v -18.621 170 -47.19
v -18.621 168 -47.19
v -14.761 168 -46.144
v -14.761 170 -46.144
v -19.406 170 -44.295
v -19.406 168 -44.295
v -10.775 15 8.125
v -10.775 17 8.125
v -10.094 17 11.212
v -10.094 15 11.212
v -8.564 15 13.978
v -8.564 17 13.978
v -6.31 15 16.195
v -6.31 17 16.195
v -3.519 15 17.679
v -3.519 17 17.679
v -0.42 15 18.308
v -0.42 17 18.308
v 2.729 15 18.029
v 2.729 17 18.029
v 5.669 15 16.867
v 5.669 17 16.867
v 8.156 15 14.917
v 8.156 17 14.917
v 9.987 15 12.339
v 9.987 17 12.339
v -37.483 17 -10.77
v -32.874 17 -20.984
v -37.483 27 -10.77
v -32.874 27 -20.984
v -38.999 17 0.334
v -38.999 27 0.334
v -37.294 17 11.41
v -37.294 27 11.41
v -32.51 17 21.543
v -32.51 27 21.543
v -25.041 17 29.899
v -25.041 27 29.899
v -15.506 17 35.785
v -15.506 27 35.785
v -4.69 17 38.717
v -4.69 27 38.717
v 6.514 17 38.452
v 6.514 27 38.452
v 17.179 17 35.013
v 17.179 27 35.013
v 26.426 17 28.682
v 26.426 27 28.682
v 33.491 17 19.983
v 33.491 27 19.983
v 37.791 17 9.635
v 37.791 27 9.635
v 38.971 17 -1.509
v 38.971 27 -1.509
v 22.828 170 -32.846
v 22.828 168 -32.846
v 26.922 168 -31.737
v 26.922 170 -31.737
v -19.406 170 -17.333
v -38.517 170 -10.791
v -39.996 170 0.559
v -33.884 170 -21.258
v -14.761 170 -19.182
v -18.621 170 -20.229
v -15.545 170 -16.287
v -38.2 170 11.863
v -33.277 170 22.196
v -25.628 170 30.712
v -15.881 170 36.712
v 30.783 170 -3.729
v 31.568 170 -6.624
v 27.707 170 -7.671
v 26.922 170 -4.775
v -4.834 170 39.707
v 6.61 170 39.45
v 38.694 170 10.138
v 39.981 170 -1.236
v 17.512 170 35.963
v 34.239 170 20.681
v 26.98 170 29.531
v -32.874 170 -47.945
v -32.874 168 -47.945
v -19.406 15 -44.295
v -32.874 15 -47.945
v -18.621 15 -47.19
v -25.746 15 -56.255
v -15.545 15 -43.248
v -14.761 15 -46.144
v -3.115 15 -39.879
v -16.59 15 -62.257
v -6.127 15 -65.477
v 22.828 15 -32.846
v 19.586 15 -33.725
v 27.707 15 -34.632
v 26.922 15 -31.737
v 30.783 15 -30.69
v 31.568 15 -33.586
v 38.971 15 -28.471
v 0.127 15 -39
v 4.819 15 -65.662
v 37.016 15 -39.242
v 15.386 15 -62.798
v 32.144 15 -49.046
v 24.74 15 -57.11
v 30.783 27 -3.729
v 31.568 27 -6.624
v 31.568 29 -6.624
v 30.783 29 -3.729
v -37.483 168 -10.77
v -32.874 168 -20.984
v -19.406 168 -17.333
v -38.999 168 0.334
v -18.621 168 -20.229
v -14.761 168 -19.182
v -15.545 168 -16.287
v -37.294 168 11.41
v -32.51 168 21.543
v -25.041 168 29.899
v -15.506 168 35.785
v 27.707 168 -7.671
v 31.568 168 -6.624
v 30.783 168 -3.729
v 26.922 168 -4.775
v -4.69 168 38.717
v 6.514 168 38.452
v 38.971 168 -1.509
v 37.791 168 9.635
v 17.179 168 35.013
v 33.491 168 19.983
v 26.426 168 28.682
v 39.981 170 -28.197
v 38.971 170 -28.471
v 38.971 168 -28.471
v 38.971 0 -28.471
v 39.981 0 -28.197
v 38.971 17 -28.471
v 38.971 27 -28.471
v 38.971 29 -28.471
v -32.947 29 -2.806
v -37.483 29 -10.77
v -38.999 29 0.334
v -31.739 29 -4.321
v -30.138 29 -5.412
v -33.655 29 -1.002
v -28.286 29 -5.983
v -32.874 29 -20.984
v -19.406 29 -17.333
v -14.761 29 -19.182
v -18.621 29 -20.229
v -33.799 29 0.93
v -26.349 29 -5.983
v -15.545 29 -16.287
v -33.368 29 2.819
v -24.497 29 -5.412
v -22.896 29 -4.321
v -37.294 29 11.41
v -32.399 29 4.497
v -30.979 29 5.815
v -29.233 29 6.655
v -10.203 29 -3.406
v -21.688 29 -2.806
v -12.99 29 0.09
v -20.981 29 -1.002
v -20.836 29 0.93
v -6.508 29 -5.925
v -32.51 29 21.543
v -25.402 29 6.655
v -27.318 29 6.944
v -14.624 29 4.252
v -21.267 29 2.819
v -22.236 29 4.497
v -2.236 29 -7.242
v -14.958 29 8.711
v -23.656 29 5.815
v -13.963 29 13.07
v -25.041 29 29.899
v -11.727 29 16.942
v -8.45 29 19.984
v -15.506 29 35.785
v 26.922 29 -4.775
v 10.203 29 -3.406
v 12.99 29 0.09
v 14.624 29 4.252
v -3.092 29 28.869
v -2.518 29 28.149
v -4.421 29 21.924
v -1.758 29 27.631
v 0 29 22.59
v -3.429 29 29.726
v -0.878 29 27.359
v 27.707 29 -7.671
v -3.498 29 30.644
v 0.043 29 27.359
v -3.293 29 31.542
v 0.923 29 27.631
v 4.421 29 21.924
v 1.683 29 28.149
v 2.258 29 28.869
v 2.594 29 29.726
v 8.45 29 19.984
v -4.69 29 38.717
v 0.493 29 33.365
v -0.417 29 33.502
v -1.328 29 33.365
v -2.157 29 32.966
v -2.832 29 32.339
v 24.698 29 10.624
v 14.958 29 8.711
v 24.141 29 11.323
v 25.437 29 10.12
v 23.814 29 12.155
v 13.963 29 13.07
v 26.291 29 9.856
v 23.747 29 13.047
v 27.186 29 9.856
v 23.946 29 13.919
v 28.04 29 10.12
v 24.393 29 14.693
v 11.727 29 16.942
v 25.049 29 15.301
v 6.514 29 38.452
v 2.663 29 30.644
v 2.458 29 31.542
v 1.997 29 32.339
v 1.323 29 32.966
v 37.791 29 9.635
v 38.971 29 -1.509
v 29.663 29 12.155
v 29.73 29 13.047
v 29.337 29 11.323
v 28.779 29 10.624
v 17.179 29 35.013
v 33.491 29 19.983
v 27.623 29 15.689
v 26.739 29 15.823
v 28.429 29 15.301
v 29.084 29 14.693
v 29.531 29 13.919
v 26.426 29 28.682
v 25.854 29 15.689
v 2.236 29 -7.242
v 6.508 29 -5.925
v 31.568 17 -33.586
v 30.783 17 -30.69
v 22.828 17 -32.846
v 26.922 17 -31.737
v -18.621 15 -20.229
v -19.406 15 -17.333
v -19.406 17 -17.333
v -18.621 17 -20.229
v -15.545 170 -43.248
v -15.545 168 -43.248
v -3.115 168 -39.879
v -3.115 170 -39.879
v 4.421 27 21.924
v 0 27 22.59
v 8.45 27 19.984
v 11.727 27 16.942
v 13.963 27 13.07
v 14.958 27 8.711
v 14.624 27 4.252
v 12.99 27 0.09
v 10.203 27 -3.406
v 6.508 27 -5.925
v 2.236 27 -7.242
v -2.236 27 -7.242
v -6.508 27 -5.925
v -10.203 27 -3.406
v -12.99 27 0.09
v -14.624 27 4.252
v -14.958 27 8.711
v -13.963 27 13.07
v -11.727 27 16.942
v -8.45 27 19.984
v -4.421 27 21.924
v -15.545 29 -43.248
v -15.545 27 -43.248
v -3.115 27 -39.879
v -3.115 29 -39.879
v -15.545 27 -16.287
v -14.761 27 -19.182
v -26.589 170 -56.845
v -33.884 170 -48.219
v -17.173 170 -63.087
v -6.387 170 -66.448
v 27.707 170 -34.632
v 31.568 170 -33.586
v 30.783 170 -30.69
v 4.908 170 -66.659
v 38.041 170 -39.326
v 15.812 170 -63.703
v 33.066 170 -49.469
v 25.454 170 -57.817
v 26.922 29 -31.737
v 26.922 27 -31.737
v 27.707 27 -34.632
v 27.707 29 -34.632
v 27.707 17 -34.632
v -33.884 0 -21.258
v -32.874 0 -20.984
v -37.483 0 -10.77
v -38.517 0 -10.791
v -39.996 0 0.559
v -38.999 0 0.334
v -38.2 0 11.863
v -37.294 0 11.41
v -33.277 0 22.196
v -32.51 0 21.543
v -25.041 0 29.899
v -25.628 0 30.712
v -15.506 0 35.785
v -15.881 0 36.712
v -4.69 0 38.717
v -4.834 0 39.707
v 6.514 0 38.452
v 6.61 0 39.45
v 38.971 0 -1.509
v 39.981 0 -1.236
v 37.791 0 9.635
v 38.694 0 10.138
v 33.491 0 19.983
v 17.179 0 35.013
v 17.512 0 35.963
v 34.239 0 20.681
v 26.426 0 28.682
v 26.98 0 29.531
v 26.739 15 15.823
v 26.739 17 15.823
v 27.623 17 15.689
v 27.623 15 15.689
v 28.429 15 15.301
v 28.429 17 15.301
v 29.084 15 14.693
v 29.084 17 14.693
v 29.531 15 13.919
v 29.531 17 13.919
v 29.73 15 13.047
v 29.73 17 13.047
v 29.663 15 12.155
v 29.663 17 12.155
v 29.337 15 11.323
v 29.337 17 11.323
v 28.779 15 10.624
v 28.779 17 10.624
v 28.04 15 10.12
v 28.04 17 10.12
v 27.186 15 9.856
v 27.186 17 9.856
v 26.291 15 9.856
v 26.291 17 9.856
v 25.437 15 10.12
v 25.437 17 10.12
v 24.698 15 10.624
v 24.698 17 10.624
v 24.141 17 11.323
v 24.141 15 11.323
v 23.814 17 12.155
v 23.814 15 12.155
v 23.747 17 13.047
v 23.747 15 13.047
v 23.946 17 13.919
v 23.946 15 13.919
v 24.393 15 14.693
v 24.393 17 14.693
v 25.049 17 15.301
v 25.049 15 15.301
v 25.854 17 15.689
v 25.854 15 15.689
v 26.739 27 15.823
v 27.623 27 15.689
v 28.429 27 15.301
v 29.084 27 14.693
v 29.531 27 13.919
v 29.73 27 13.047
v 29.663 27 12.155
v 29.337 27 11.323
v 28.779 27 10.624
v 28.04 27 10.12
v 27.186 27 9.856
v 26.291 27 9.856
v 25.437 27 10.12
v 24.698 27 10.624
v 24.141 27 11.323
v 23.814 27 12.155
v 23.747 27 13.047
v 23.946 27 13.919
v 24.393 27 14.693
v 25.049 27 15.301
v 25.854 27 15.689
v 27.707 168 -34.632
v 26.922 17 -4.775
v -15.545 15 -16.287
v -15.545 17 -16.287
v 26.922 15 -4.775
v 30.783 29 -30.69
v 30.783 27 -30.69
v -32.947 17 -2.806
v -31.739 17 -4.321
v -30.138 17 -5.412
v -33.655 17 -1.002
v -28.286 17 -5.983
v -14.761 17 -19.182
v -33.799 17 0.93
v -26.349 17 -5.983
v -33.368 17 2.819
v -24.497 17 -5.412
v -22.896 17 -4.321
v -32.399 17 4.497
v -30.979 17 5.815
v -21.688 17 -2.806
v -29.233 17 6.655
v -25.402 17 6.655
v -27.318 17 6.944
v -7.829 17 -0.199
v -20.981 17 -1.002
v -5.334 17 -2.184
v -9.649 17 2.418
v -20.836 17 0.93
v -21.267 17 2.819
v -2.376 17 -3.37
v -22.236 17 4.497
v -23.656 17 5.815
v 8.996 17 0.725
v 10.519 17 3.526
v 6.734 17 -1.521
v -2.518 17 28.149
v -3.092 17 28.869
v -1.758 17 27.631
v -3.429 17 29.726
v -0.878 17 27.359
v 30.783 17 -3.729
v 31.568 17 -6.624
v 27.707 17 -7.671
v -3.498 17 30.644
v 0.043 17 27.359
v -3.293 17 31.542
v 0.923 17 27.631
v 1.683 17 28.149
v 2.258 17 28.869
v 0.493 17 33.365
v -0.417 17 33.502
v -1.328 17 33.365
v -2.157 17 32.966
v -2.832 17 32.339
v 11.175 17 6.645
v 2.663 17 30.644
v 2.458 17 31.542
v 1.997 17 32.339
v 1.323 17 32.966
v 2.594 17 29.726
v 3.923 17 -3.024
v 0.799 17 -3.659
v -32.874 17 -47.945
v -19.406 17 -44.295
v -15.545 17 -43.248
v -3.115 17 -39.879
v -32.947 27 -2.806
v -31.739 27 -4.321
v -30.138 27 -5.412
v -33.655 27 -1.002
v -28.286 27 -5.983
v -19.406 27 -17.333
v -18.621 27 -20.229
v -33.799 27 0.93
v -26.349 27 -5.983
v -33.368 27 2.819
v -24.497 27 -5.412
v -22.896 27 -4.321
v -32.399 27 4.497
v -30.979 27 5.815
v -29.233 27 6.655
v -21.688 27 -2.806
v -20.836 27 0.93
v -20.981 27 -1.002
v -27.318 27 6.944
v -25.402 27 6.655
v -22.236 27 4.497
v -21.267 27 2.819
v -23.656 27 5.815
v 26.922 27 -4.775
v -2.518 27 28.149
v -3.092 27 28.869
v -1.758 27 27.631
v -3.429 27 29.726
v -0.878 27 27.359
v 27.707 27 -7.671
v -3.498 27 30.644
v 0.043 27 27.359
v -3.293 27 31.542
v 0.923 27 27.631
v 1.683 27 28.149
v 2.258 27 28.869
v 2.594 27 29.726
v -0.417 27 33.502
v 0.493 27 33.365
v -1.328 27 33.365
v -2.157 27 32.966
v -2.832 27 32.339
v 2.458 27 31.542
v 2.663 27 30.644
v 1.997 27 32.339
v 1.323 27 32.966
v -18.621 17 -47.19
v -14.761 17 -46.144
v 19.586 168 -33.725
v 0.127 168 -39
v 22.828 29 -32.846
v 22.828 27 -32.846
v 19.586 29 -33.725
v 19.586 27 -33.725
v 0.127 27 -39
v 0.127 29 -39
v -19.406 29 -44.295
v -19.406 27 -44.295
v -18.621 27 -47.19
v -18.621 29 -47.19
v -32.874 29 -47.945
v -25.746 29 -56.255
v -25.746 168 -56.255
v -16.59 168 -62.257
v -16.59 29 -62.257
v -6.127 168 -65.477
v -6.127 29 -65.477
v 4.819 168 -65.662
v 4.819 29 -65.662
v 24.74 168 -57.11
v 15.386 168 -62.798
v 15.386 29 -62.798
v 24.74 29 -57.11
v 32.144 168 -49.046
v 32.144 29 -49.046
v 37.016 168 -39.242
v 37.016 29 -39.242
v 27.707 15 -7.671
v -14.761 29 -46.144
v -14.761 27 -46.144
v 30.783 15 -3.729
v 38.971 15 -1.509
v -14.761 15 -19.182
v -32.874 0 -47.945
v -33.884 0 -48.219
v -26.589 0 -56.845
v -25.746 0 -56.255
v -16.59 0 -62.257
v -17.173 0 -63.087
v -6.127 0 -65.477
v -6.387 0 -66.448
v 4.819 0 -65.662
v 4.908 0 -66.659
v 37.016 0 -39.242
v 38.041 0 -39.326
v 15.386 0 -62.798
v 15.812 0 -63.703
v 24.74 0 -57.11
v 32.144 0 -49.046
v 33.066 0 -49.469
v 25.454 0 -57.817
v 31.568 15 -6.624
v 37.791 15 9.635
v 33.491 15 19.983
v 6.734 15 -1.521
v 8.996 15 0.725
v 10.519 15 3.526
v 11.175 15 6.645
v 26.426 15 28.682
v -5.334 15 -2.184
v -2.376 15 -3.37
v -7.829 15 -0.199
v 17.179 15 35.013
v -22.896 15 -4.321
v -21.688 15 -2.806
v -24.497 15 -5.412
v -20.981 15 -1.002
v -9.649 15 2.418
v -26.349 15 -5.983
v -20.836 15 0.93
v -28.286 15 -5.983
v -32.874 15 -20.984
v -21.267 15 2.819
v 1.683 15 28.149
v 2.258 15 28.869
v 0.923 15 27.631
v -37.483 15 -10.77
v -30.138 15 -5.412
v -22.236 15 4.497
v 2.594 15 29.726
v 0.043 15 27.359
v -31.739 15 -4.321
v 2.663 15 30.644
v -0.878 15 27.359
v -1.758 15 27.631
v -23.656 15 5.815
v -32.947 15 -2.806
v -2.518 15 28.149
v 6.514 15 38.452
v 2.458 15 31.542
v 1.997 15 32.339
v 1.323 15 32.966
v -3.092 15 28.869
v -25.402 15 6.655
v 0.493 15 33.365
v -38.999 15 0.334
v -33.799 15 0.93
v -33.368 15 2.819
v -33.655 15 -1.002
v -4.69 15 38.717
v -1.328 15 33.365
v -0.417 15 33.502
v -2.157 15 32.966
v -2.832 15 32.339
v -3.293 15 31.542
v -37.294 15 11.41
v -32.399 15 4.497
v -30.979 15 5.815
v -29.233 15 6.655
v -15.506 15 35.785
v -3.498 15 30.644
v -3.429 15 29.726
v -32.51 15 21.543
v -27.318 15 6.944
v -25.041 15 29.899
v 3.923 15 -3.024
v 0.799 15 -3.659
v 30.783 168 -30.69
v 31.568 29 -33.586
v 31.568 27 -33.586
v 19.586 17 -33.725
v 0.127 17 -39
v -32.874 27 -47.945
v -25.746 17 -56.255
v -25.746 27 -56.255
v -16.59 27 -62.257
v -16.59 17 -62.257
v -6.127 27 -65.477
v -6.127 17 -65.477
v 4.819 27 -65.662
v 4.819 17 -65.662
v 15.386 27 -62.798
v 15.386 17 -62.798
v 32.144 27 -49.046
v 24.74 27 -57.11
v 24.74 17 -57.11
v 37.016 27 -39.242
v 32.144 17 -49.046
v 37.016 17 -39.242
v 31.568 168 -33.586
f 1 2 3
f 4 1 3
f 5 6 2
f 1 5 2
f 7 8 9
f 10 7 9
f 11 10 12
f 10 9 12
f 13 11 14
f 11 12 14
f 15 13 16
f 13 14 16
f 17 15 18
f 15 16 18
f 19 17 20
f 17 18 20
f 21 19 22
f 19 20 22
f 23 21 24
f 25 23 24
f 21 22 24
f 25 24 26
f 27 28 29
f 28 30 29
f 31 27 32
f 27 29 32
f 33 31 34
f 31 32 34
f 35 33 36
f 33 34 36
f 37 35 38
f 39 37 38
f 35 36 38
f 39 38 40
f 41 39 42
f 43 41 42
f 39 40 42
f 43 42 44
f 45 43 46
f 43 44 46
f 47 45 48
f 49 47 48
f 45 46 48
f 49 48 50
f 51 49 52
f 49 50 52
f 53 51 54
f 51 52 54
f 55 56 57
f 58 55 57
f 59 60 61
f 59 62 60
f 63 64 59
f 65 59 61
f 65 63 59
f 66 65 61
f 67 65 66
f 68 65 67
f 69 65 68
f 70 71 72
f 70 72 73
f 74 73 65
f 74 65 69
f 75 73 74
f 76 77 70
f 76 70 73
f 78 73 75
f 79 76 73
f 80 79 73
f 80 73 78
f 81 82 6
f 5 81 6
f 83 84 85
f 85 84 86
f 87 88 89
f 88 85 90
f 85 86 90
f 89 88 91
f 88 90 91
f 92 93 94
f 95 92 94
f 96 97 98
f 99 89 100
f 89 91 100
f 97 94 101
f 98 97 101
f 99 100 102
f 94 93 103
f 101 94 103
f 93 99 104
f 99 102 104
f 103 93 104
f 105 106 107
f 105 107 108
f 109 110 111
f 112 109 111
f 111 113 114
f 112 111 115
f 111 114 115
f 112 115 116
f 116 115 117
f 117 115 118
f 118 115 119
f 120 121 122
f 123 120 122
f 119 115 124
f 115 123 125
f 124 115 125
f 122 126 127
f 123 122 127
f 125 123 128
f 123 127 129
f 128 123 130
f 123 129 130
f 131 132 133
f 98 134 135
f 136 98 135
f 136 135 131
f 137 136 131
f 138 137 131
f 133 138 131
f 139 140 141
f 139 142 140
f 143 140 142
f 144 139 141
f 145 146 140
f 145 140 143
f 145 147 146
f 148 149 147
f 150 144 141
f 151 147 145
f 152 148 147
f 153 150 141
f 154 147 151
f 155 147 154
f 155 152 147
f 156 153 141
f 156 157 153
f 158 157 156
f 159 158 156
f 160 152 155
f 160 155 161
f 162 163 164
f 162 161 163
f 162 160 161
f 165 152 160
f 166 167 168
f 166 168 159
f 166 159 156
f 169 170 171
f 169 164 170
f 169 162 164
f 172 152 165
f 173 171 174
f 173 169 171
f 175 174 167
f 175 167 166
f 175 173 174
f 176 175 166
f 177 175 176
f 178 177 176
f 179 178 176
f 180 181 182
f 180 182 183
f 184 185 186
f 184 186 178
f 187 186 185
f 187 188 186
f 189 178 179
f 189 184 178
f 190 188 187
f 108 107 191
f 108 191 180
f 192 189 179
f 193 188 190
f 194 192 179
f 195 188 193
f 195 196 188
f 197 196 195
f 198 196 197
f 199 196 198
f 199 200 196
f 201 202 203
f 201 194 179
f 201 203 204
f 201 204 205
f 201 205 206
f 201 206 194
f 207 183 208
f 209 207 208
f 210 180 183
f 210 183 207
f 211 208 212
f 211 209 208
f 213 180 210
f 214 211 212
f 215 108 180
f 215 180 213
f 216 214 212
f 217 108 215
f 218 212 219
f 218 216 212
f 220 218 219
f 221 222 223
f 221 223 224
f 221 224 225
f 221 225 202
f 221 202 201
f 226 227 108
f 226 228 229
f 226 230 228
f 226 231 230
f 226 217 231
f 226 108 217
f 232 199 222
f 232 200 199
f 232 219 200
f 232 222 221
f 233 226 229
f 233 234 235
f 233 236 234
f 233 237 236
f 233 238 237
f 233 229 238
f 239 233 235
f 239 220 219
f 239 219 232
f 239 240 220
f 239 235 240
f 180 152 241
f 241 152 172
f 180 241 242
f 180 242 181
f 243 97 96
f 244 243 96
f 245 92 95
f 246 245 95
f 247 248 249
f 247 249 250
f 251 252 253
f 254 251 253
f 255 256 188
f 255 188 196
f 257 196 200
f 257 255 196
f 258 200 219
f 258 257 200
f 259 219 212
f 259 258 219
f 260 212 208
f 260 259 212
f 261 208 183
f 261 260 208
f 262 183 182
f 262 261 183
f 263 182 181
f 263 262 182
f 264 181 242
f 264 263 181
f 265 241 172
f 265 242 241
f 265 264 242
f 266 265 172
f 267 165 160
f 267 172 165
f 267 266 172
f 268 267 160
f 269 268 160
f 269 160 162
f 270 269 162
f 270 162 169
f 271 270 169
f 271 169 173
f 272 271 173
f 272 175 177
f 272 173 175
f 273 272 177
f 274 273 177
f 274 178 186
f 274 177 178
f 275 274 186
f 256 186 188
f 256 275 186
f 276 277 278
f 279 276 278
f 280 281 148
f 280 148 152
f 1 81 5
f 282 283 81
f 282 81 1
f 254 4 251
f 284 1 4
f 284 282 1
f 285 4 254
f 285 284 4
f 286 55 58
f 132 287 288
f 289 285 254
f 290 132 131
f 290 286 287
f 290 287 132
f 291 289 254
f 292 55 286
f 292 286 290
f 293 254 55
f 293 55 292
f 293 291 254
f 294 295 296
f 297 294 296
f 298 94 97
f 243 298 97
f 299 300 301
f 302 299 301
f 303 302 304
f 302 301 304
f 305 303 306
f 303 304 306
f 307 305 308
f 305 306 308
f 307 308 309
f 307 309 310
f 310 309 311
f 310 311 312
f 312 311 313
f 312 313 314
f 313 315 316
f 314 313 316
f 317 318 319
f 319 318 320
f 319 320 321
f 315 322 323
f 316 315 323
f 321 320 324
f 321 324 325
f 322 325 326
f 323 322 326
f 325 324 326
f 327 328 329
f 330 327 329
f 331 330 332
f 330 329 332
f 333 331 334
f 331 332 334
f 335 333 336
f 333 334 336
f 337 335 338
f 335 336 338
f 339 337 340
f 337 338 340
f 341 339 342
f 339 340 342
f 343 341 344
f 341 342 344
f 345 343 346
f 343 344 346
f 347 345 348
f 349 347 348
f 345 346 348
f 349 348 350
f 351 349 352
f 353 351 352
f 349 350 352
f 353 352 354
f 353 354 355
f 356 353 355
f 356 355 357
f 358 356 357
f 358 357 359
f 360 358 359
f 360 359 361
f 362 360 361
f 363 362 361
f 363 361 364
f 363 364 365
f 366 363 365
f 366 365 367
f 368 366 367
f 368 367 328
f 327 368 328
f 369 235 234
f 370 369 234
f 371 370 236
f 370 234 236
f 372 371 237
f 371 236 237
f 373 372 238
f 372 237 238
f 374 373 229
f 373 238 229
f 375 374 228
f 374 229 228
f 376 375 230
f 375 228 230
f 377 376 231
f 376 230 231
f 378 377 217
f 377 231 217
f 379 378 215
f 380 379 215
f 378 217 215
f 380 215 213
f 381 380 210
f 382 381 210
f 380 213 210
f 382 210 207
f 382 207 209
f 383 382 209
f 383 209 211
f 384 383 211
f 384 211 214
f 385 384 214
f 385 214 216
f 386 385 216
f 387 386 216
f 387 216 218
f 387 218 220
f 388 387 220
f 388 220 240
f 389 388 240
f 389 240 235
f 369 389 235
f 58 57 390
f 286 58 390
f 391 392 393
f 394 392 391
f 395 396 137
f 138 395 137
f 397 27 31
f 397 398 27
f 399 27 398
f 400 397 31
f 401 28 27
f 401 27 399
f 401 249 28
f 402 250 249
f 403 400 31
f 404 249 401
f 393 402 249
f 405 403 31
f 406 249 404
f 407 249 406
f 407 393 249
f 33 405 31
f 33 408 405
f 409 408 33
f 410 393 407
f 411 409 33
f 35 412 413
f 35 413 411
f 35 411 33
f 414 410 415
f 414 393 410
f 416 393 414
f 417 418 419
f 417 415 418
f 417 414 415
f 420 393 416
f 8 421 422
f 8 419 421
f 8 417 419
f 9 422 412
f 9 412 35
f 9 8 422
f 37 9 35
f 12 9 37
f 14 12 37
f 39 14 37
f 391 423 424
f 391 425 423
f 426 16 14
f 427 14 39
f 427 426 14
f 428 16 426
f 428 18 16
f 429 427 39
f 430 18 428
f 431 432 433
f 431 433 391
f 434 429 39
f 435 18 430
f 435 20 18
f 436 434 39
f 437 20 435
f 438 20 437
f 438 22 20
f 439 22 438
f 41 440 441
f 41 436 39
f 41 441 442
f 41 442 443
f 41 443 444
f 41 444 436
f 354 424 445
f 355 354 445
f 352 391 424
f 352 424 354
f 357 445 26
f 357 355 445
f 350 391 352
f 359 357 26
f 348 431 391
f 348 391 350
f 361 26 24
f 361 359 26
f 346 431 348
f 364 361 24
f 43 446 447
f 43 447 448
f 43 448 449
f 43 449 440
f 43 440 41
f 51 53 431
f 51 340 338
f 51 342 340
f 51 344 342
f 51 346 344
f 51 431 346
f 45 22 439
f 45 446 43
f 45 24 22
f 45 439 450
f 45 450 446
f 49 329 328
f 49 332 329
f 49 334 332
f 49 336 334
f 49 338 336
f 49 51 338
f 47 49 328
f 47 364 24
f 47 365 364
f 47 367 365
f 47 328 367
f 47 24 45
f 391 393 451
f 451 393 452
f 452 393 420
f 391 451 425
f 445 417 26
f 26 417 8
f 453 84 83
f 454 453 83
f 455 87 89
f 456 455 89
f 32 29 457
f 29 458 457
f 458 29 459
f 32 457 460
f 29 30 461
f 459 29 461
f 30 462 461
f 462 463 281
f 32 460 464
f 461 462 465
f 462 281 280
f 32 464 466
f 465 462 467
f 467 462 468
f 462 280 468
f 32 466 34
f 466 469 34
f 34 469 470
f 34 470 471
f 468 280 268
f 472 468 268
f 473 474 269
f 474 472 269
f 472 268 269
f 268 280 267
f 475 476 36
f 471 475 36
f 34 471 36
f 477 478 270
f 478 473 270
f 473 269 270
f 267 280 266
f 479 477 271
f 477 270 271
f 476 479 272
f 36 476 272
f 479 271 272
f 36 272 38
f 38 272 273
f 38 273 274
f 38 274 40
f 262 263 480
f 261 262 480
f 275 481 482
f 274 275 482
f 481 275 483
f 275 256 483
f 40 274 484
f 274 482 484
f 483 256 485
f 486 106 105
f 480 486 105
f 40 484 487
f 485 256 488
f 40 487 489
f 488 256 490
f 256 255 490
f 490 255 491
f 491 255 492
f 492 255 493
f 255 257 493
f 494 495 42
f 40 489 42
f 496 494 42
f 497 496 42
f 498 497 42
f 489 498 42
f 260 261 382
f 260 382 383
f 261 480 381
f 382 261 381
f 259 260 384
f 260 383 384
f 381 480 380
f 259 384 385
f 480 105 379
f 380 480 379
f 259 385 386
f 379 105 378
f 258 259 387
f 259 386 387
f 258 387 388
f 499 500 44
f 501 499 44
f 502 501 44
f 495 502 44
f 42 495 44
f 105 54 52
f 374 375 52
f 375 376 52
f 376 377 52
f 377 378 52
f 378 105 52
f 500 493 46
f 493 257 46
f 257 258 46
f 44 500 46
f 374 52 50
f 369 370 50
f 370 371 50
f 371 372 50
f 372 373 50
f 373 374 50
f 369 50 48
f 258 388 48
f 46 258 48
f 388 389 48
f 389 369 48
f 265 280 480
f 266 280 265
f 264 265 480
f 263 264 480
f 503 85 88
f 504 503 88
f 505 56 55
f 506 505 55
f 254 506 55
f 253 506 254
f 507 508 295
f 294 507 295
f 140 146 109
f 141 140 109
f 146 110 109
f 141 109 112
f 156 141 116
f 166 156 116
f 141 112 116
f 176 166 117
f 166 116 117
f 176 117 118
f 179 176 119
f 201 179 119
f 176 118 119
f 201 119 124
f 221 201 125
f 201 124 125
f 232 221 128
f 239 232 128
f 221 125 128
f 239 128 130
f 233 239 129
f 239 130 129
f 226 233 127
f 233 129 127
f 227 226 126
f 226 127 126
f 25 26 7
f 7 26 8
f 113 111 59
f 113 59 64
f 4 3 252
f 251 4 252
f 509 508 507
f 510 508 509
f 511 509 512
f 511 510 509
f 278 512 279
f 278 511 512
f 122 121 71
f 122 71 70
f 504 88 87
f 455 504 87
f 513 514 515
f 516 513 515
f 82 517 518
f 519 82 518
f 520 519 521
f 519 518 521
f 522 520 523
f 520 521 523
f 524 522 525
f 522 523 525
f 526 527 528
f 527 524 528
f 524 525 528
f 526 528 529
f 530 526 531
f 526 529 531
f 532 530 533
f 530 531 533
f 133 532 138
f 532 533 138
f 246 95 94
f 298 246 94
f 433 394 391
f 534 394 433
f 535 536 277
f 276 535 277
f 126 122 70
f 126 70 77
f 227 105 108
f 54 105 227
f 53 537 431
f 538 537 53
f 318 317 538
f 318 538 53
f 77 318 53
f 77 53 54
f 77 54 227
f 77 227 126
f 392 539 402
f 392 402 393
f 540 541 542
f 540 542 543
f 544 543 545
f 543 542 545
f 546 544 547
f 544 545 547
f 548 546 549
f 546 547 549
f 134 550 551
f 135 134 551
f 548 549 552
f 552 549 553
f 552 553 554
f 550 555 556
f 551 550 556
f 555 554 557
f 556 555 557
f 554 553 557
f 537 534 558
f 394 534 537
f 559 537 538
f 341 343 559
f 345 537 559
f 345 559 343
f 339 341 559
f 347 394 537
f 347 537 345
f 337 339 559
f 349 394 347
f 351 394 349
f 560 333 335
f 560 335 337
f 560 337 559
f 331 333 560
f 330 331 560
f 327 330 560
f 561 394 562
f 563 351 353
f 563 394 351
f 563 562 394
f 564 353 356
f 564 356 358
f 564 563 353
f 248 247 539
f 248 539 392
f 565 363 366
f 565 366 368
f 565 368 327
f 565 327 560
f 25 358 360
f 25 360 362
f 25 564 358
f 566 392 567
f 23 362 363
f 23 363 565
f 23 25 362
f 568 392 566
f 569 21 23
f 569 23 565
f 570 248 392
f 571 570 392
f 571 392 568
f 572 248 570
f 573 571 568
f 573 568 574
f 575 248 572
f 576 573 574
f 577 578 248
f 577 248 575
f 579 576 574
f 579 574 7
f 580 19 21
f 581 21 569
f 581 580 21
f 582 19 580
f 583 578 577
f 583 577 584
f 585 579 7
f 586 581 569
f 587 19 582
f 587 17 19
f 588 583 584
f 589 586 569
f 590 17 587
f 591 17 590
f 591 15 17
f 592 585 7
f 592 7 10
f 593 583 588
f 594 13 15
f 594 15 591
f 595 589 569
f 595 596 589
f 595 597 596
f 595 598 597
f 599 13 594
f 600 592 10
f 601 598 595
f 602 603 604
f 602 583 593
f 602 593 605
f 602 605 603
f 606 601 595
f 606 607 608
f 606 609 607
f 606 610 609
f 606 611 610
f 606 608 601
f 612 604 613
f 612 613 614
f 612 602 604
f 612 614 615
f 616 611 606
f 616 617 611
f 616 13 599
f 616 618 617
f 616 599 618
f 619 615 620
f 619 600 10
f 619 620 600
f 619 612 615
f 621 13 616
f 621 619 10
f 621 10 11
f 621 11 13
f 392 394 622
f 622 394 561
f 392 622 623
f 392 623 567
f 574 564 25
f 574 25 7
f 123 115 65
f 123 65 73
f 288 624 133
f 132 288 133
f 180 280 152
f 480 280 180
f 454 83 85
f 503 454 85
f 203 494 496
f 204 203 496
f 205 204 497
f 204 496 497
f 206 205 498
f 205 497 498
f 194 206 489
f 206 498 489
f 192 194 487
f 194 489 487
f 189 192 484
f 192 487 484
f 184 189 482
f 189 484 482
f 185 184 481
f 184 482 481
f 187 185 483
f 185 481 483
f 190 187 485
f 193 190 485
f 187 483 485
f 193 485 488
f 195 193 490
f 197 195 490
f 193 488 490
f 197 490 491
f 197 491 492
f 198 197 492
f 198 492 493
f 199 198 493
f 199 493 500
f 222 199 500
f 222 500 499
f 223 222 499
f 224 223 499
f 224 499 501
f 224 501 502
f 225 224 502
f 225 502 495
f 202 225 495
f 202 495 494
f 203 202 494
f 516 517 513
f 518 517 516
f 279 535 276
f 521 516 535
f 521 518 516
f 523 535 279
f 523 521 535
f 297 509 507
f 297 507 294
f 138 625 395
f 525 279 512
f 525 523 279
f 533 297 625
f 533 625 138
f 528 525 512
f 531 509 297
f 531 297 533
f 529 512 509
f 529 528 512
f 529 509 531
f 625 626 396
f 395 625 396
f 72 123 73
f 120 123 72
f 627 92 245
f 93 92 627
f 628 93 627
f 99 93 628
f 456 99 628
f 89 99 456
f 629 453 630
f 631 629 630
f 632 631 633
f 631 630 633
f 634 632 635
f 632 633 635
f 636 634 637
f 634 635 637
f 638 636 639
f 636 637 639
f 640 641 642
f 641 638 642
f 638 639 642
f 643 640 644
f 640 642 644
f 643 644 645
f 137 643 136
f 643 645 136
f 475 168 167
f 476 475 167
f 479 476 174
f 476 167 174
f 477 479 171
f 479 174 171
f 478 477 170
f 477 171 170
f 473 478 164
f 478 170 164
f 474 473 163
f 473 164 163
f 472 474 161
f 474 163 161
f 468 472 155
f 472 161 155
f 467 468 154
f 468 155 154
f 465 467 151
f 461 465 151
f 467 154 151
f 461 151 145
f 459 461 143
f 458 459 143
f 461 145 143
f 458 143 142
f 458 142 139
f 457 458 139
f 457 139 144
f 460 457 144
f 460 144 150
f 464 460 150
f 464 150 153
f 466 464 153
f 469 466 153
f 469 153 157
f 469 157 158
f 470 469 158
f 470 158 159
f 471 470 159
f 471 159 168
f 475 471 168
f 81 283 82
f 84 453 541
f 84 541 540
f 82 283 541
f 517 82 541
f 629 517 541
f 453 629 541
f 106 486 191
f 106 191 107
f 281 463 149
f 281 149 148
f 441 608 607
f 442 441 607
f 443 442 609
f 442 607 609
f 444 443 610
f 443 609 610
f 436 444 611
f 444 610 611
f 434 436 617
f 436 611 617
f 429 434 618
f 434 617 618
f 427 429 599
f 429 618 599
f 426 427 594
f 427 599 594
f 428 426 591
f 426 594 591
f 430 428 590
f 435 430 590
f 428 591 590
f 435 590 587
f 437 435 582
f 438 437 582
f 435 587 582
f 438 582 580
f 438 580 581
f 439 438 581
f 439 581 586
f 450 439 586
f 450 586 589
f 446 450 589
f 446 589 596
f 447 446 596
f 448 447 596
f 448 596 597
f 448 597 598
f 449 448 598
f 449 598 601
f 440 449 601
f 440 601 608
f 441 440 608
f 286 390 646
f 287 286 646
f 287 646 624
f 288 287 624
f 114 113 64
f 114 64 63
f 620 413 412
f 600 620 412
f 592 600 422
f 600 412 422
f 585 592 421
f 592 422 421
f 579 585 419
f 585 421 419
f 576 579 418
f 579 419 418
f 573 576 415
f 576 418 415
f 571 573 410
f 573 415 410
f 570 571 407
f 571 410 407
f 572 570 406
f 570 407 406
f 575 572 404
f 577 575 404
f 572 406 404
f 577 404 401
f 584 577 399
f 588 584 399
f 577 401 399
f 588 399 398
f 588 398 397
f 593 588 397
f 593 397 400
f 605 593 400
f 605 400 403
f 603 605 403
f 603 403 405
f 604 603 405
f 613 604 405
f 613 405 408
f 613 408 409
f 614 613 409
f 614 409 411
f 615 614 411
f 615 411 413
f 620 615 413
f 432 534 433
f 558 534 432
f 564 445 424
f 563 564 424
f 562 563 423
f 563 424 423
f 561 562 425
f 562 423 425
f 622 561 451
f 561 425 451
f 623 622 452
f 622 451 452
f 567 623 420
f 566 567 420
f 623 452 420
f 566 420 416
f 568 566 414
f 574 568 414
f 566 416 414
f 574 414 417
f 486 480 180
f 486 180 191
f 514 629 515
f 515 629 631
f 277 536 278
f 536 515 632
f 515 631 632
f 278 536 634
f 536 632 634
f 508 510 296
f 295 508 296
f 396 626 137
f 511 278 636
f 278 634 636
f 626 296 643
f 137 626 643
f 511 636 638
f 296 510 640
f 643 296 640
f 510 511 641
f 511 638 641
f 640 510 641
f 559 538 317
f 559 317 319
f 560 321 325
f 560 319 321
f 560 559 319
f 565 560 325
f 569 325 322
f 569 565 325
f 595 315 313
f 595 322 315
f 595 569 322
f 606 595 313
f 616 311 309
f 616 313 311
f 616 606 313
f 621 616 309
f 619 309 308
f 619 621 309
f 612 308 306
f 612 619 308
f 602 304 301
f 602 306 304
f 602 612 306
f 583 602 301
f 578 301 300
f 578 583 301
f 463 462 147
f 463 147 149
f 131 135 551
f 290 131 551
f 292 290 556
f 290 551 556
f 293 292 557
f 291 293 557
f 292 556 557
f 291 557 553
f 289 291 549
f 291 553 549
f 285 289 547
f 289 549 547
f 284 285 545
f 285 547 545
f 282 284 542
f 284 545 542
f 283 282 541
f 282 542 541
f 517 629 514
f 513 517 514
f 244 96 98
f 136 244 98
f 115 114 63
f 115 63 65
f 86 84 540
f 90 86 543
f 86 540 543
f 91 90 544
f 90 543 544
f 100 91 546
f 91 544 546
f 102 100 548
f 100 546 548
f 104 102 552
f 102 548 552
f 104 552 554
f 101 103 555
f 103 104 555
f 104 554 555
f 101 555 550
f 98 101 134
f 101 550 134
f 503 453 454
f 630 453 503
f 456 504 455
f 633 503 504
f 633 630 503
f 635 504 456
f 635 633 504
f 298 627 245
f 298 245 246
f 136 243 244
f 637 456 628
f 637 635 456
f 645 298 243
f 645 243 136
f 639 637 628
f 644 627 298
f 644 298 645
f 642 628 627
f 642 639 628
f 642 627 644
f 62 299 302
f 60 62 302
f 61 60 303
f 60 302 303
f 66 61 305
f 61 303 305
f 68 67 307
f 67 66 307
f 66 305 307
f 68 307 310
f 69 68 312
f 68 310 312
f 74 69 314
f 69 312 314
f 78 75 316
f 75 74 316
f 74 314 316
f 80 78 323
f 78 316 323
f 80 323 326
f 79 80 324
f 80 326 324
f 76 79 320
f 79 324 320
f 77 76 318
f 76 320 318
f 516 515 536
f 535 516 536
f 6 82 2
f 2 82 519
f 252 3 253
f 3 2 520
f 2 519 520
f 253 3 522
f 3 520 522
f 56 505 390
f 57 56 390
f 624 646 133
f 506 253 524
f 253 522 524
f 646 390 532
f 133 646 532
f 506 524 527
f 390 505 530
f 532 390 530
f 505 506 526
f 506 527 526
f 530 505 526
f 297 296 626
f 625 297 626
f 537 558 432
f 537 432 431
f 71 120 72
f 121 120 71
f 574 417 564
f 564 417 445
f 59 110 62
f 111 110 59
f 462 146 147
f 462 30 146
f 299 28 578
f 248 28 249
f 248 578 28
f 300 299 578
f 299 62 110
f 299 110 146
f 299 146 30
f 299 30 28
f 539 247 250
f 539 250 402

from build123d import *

# Parameters (mm, degrees)
SKETCH1_R               = 40
BOSS_EXTRUDE1_DEPTH     = 170
SKETCH3_R               = 39
CUT_EXTRUDE1_DEPTH      = 153
CUT_EXTRUDE2_START      = -15
SKETCH5_R               = 39
CUT_EXTRUDE2_DEPTH      = 15
SKETCH6_R               = 40
BOSS_EXTRUDE2_DEPTH     = 2
SKETCH12_R              = 15
CUT_EXTRUDE5_DEPTH      = 19
CUT_EXTRUDE6_DEPTH      = 19
SKETCH16_R              = 3.088837779
CUT_EXTRUDE7_DEPTH      = 19
SKETCH17_R              = 3
CUT_EXTRUDE8_DEPTH      = 19
SKETCH18_R              = 6.5
CUT_EXTRUDE9_DEPTH      = 19
BOSS_EXTRUDE3_START     = -2
SKETCH19_R              = 40
BOSS_EXTRUDE3_DEPTH     = 2
SPLIT1_SURFACE_1_BACK   = 205.206
SPLIT1_SURFACE_1_DEPTH  = 410.412
SPLIT1_SURFACE_2_BACK   = 205.206
SPLIT1_SURFACE_2_DEPTH  = 410.412
BODY_MOVE_COPY1_DEPTH   = 170
BODY_MOVE_COPY1_START   = 29
BODY_MOVE_COPY1_2_DEPTH = 139
BODY_MOVE_COPY1_3_DEPTH = 15
BODY_MOVE_COPY1_START_2 = 17
BODY_MOVE_COPY1_4_DEPTH = 10
BODY_MOVE_COPY1_5_DEPTH = 170
BODY_MOVE_COPY1_START_3 = 15
BODY_MOVE_COPY1_6_DEPTH = 2
BODY_MOVE_COPY1_START_4 = 27
BODY_MOVE_COPY1_7_DEPTH = 2
BODY_MOVE_COPY1_START_5 = 168
BODY_MOVE_COPY1_8_DEPTH = 2


# Read off the part's stored shape, not the designer's step: Body-Move/Copy1
with BuildPart() as part:
    # Sketch1 → Boss-Extrude1 (new body)
    with BuildSketch(Plane(origin=(0, 0, 0), x_dir=(1, 0, 0), z_dir=(0, 1, 0))):
        with Locations(Location((0, 0, 0), (0, 0, 270))):
            Circle(SKETCH1_R)
    extrude(amount=BOSS_EXTRUDE1_DEPTH)

    # Sketch3 → Cut-Extrude1 (cut)
    with BuildSketch(Plane(origin=(0, 170, 0), x_dir=(1, 0, 0), z_dir=(0, 1, 0))):
        with Locations(Location((0, 0, 0), (0, 0, 270))):
            Circle(SKETCH3_R)
    extrude(amount=-CUT_EXTRUDE1_DEPTH, mode=Mode.SUBTRACT)

    # Sketch5 → Cut-Extrude2 (cut)
    with BuildSketch(Plane.XZ.offset(CUT_EXTRUDE2_START)):
        with Locations(Location((0, 0, 0), (0, 0, 90))):
            Circle(SKETCH5_R)
    extrude(amount=CUT_EXTRUDE2_DEPTH, mode=Mode.SUBTRACT)

    # Sketch6 → Boss-Extrude2 (add)
    with BuildSketch(Plane(origin=(0, 27, 0), x_dir=(1, 0, 0), z_dir=(0, 1, 0))):
        with Locations(Location((0, 0, 0), (0, 0, 270))):
            Circle(SKETCH6_R)
    extrude(amount=BOSS_EXTRUDE2_DEPTH)

    # Sketch12 → Cut-Extrude5 (cut)
    with BuildSketch(Plane(origin=(0, 17, 0), x_dir=(1, 0, 0), z_dir=(0, 1, 0))):
        with Locations(Location((0, -7.590009818, 0), (0, 0, 270))):
            Circle(SKETCH12_R)
    extrude(amount=CUT_EXTRUDE5_DEPTH, mode=Mode.SUBTRACT)

    # Sketch15 → Cut-Extrude6 (cut)
    with BuildSketch(Plane(origin=(0, 17, 0), x_dir=(1, 0, 0), z_dir=(0, 1, 0))):
        with BuildLine():
            ThreePointArc((11.174993965, -6.645365205), (2.384185489, 3.45521331), (-9.64910652, -2.418446828))
            Line((-9.64910652, -2.418446828), (11.174993965, -6.645365205))
        make_face()
        with BuildLine():
            Line((9.986768127, -12.339026438), (-10.774875926, -8.124785595))
            ThreePointArc((-10.774875926, -8.124785595), (-1.992172654, -18.105108798), (9.986768127, -12.339026438))
        make_face()
    extrude(amount=-CUT_EXTRUDE6_DEPTH, mode=Mode.SUBTRACT)

    # Sketch16 → Cut-Extrude7 (cut)
    with BuildSketch(Plane.XZ.offset(-15)):
        with Locations(Location((-0.417469766, 30.413602278, 0), (0, 0, 90))):
            Circle(SKETCH16_R)
    extrude(amount=-CUT_EXTRUDE7_DEPTH, mode=Mode.SUBTRACT)

    # Sketch17 → Cut-Extrude8 (cut)
    with BuildSketch(Plane(origin=(0, 29, 0), x_dir=(1, 0, 0), z_dir=(0, 1, 0))):
        with Locations(Location((26.738607031, -12.822711748, 0), (0, 0, 270))):
            Circle(SKETCH17_R)
    extrude(amount=-CUT_EXTRUDE8_DEPTH, mode=Mode.SUBTRACT)

    # Sketch18 → Cut-Extrude9 (cut)
    with BuildSketch(Plane(origin=(0, 29, 0), x_dir=(1, 0, 0), z_dir=(0, 1, 0))):
        with Locations(Location((-27.317556841, -0.444207085, 0), (0, 0, 270))):
            Circle(SKETCH18_R)
    extrude(amount=-CUT_EXTRUDE9_DEPTH, mode=Mode.SUBTRACT)

    # Sketch19 → Boss-Extrude3 (add)
    with BuildSketch(Plane(origin=(0, 170, 0), x_dir=(1, 0, 0), z_dir=(0, 1, 0)).offset(BOSS_EXTRUDE3_START)):
        with Locations(Location((0, 0, 0), (0, 0, 270))):
            Circle(SKETCH19_R)
    extrude(amount=BOSS_EXTRUDE3_DEPTH)


with BuildPart() as body_2:
    # Split1: the piece behind the surface
    add(part.part)
    # Split1 surface: a surface, the sketch's curves swept straight by 410.412 mm
    with BuildLine(Plane(origin=(0, 170, 0), x_dir=(1, 0, 0), z_dir=(0, 1, 0)).offset(-SPLIT1_SURFACE_1_BACK), mode=Mode.PRIVATE) as split1_surface_1_path:
        Line((-33.883669555, 21.257867661), (-19.406133031, 17.333465005))
        Line((-19.406133031, 17.333465005), (-18.6212525, 20.22897231))
        Line((-18.6212525, 20.22897231), (-14.760576094, 19.182464935))
        Line((-14.760576094, 19.182464935), (-15.545456625, 16.28695763))
        Line((-15.545456625, 16.28695763), (26.921983844, 4.775376504))
        Line((26.921983844, 4.775376504), (27.706864375, 7.670883809))
        Line((27.706864375, 7.670883809), (31.567540782, 6.624376434))
        Line((31.567540782, 6.624376434), (30.78266025, 3.728869129))
        Line((30.78266025, 3.728869129), (45.260196774, -0.195533527))
    split1_surface_1 = Shell.extrude(split1_surface_1_path.wire(), (0 * SPLIT1_SURFACE_1_DEPTH, 1 * SPLIT1_SURFACE_1_DEPTH, 0 * SPLIT1_SURFACE_1_DEPTH))
    split(bisect_by=split1_surface_1, keep=Keep.BOTTOM)


with BuildPart() as part_1:
    add(part.part)

    # Split1: split by a surface, the side it looks to stays
    # Split1 surface: a surface, the sketch's curves swept straight by 410.412 mm
    with BuildLine(Plane(origin=(0, 170, 0), x_dir=(1, 0, 0), z_dir=(0, 1, 0)).offset(-SPLIT1_SURFACE_2_BACK), mode=Mode.PRIVATE) as split1_surface_2_path:
        Line((-33.883669555, 21.257867661), (-19.406133031, 17.333465005))
        Line((-19.406133031, 17.333465005), (-18.6212525, 20.22897231))
        Line((-18.6212525, 20.22897231), (-14.760576094, 19.182464935))
        Line((-14.760576094, 19.182464935), (-15.545456625, 16.28695763))
        Line((-15.545456625, 16.28695763), (26.921983844, 4.775376504))
        Line((26.921983844, 4.775376504), (27.706864375, 7.670883809))
        Line((27.706864375, 7.670883809), (31.567540782, 6.624376434))
        Line((31.567540782, 6.624376434), (30.78266025, 3.728869129))
        Line((30.78266025, 3.728869129), (45.260196774, -0.195533527))
    split1_surface_2 = Shell.extrude(split1_surface_2_path.wire(), (0 * SPLIT1_SURFACE_2_DEPTH, 1 * SPLIT1_SURFACE_2_DEPTH, 0 * SPLIT1_SURFACE_2_DEPTH))
    split(bisect_by=split1_surface_2, keep=Keep.TOP)

    # Body-Move/Copy1 outline → Body-Move/Copy1 (cut)
    with BuildSketch(Plane(origin=(0, 0, 0), x_dir=(1, 0, 0), z_dir=(0, 1, 0))):
        with BuildLine():
            ThreePointArc((39.980914288, 1.235513127), (35.157526041, 19.077430715), (22.828025818, 32.846327607))
            Line((22.828025818, 32.846327607), (-3.114608044, 39.878555851))
            ThreePointArc((-3.114608044, 39.878555851), (-20.70991655, 34.221328971), (-33.883669555, 21.257867661))
            Line((-33.883669555, 21.257867661), (-19.406133031, 17.333465005))
            Line((-19.406133031, 17.333465005), (-18.6212525, 20.22897231))
            Line((-18.6212525, 20.22897231), (-14.760576094, 19.182464935))
            Line((-14.760576094, 19.182464935), (-15.545456625, 16.28695763))
            Line((-15.545456625, 16.28695763), (26.921983844, 4.775376504))
            Line((26.921983844, 4.775376504), (27.706864375, 7.670883809))
            Line((27.706864375, 7.670883809), (31.567540782, 6.624376434))
            Line((31.567540782, 6.624376434), (30.78266025, 3.728869129))
            Line((30.78266025, 3.728869129), (39.980914288, 1.235513127))
        make_face()
    extrude(amount=BODY_MOVE_COPY1_DEPTH, mode=Mode.SUBTRACT)

    # Body-Move_Copy1 2 outline → Body-Move_Copy1 2 (cut)
    with BuildSketch(Plane(origin=(0, 0, 0), x_dir=(1, 0, 0), z_dir=(0, 1, 0)).offset(BODY_MOVE_COPY1_START)):
        with BuildLine():
            Line((19.586174582, 33.725091034), (22.828025818, 32.846327607))
            ThreePointArc((22.828025818, 32.846327607), (10.46507375, 38.606764063), (-3.114608044, 39.878555851))
            Line((-3.114608044, 39.878555851), (0.127243191, 38.999792425))
            ThreePointArc((0.127243191, 38.999792425), (10.203446906, 37.641594961), (19.586174582, 33.725091034))
        make_face()
    extrude(amount=BODY_MOVE_COPY1_2_DEPTH, mode=Mode.SUBTRACT)

    # Body-Move_Copy1 3 outline → Body-Move_Copy1 3 (cut)
    with BuildSketch(Plane(origin=(0, 0, 0), x_dir=(1, 0, 0), z_dir=(0, 1, 0))):
        with BuildLine():
            Line((19.586174582, 33.725091034), (22.828025818, 32.846327607))
            ThreePointArc((22.828025818, 32.846327607), (10.46507375, 38.606764063), (-3.114608044, 39.878555851))
            Line((-3.114608044, 39.878555851), (0.127243191, 38.999792425))
            ThreePointArc((0.127243191, 38.999792425), (10.203446906, 37.641594961), (19.586174582, 33.725091034))
        make_face()
    extrude(amount=BODY_MOVE_COPY1_3_DEPTH, mode=Mode.SUBTRACT)

    # Body-Move_Copy1 4 outline → Body-Move_Copy1 4 (cut)
    with BuildSketch(Plane(origin=(0, 0, 0), x_dir=(1, 0, 0), z_dir=(0, 1, 0)).offset(BODY_MOVE_COPY1_START_2)):
        with BuildLine():
            Line((19.586174582, 33.725091034), (22.828025818, 32.846327607))
            ThreePointArc((22.828025818, 32.846327607), (10.46507375, 38.606764063), (-3.114608044, 39.878555851))
            Line((-3.114608044, 39.878555851), (0.127243191, 38.999792425))
            ThreePointArc((0.127243191, 38.999792425), (10.203446906, 37.641594961), (19.586174582, 33.725091034))
        make_face()
    extrude(amount=BODY_MOVE_COPY1_4_DEPTH, mode=Mode.SUBTRACT)



with BuildPart() as body_3:
    # Body-Move_Copy1 5 outline → Body-Move_Copy1 5 (new body)
    with BuildSketch(Plane(origin=(0, 0, 0), x_dir=(1, 0, 0), z_dir=(0, 1, 0))):
        with BuildLine():
            ThreePointArc((-32.873538292, 47.945261449), (10.203446907, 64.602803414), (38.970783025, 28.470536245))
            Line((38.970783025, 28.470536245), (39.980914288, 28.19672158))
            ThreePointArc((39.980914288, 28.19672158), (10.46507375, 65.567972515), (-33.883669555, 48.219076114))
            Line((-33.883669555, 48.219076114), (-32.873538292, 47.945261449))
        make_face()
    extrude(amount=BODY_MOVE_COPY1_5_DEPTH)


with BuildPart() as part_2:
    add(part_1.part)

    add(body_3.part)  # Body-Move_Copy1 6 merges body 3
    # Body-Move_Copy1 6 outline → Body-Move_Copy1 6 (add)
    with BuildSketch(Plane(origin=(0, 0, 0), x_dir=(1, 0, 0), z_dir=(0, 1, 0)).offset(BODY_MOVE_COPY1_START_3)):
        with BuildLine():
            Line((31.567540782, 33.585584886), (30.78266025, 30.690077582))
            Line((30.78266025, 30.690077582), (38.970783025, 28.470536245))
            ThreePointArc((38.970783025, 28.470536245), (10.203446907, 64.602803414), (-32.873538292, 47.945261449))
            Line((-32.873538292, 47.945261449), (-19.406133031, 44.294673457))
            Line((-19.406133031, 44.294673457), (-18.6212525, 47.190180762))
            Line((-18.6212525, 47.190180762), (-14.760576094, 46.143673387))
            Line((-14.760576094, 46.143673387), (-15.545456625, 43.248166082))
            Line((-15.545456625, 43.248166082), (-3.114608044, 39.878555851))
            ThreePointArc((-3.114608044, 39.878555851), (10.46507375, 38.606764063), (22.828025818, 32.846327607))
            Line((22.828025818, 32.846327607), (26.921983844, 31.736584957))
            Line((26.921983844, 31.736584957), (27.706864375, 34.632092261))
            Line((27.706864375, 34.632092261), (31.567540782, 33.585584886))
        make_face()
    extrude(amount=BODY_MOVE_COPY1_6_DEPTH)

    # Body-Move_Copy1 7 outline → Body-Move_Copy1 7 (add)
    with BuildSketch(Plane(origin=(0, 0, 0), x_dir=(1, 0, 0), z_dir=(0, 1, 0)).offset(BODY_MOVE_COPY1_START_4)):
        with BuildLine():
            Line((31.567540782, 33.585584886), (30.78266025, 30.690077582))
            Line((30.78266025, 30.690077582), (38.970783025, 28.470536245))
            ThreePointArc((38.970783025, 28.470536245), (10.203446907, 64.602803414), (-32.873538292, 47.945261449))
            Line((-32.873538292, 47.945261449), (-19.406133031, 44.294673457))
            Line((-19.406133031, 44.294673457), (-18.6212525, 47.190180762))
            Line((-18.6212525, 47.190180762), (-14.760576094, 46.143673387))
            Line((-14.760576094, 46.143673387), (-15.545456625, 43.248166082))
            Line((-15.545456625, 43.248166082), (-3.114608044, 39.878555851))
            ThreePointArc((-3.114608044, 39.878555851), (10.46507375, 38.606764063), (22.828025818, 32.846327607))
            Line((22.828025818, 32.846327607), (26.921983844, 31.736584957))
            Line((26.921983844, 31.736584957), (27.706864375, 34.632092261))
            Line((27.706864375, 34.632092261), (31.567540782, 33.585584886))
        make_face()
    extrude(amount=BODY_MOVE_COPY1_7_DEPTH)

    # Body-Move_Copy1 8 outline → Body-Move_Copy1 8 (add)
    with BuildSketch(Plane(origin=(0, 0, 0), x_dir=(1, 0, 0), z_dir=(0, 1, 0)).offset(BODY_MOVE_COPY1_START_5)):
        with BuildLine():
            Line((31.567540782, 33.585584886), (30.78266025, 30.690077582))
            Line((30.78266025, 30.690077582), (38.970783025, 28.470536245))
            ThreePointArc((38.970783025, 28.470536245), (10.203446907, 64.602803414), (-32.873538292, 47.945261449))
            Line((-32.873538292, 47.945261449), (-19.406133031, 44.294673457))
            Line((-19.406133031, 44.294673457), (-18.6212525, 47.190180762))
            Line((-18.6212525, 47.190180762), (-14.760576094, 46.143673387))
            Line((-14.760576094, 46.143673387), (-15.545456625, 43.248166082))
            Line((-15.545456625, 43.248166082), (-3.114608044, 39.878555851))
            ThreePointArc((-3.114608044, 39.878555851), (10.46507375, 38.606764063), (22.828025818, 32.846327607))
            Line((22.828025818, 32.846327607), (26.921983844, 31.736584957))
            Line((26.921983844, 31.736584957), (27.706864375, 34.632092261))
            Line((27.706864375, 34.632092261), (31.567540782, 33.585584886))
        make_face()
    extrude(amount=BODY_MOVE_COPY1_8_DEPTH)


solid = Compound([body_2.part, part_2.part])
